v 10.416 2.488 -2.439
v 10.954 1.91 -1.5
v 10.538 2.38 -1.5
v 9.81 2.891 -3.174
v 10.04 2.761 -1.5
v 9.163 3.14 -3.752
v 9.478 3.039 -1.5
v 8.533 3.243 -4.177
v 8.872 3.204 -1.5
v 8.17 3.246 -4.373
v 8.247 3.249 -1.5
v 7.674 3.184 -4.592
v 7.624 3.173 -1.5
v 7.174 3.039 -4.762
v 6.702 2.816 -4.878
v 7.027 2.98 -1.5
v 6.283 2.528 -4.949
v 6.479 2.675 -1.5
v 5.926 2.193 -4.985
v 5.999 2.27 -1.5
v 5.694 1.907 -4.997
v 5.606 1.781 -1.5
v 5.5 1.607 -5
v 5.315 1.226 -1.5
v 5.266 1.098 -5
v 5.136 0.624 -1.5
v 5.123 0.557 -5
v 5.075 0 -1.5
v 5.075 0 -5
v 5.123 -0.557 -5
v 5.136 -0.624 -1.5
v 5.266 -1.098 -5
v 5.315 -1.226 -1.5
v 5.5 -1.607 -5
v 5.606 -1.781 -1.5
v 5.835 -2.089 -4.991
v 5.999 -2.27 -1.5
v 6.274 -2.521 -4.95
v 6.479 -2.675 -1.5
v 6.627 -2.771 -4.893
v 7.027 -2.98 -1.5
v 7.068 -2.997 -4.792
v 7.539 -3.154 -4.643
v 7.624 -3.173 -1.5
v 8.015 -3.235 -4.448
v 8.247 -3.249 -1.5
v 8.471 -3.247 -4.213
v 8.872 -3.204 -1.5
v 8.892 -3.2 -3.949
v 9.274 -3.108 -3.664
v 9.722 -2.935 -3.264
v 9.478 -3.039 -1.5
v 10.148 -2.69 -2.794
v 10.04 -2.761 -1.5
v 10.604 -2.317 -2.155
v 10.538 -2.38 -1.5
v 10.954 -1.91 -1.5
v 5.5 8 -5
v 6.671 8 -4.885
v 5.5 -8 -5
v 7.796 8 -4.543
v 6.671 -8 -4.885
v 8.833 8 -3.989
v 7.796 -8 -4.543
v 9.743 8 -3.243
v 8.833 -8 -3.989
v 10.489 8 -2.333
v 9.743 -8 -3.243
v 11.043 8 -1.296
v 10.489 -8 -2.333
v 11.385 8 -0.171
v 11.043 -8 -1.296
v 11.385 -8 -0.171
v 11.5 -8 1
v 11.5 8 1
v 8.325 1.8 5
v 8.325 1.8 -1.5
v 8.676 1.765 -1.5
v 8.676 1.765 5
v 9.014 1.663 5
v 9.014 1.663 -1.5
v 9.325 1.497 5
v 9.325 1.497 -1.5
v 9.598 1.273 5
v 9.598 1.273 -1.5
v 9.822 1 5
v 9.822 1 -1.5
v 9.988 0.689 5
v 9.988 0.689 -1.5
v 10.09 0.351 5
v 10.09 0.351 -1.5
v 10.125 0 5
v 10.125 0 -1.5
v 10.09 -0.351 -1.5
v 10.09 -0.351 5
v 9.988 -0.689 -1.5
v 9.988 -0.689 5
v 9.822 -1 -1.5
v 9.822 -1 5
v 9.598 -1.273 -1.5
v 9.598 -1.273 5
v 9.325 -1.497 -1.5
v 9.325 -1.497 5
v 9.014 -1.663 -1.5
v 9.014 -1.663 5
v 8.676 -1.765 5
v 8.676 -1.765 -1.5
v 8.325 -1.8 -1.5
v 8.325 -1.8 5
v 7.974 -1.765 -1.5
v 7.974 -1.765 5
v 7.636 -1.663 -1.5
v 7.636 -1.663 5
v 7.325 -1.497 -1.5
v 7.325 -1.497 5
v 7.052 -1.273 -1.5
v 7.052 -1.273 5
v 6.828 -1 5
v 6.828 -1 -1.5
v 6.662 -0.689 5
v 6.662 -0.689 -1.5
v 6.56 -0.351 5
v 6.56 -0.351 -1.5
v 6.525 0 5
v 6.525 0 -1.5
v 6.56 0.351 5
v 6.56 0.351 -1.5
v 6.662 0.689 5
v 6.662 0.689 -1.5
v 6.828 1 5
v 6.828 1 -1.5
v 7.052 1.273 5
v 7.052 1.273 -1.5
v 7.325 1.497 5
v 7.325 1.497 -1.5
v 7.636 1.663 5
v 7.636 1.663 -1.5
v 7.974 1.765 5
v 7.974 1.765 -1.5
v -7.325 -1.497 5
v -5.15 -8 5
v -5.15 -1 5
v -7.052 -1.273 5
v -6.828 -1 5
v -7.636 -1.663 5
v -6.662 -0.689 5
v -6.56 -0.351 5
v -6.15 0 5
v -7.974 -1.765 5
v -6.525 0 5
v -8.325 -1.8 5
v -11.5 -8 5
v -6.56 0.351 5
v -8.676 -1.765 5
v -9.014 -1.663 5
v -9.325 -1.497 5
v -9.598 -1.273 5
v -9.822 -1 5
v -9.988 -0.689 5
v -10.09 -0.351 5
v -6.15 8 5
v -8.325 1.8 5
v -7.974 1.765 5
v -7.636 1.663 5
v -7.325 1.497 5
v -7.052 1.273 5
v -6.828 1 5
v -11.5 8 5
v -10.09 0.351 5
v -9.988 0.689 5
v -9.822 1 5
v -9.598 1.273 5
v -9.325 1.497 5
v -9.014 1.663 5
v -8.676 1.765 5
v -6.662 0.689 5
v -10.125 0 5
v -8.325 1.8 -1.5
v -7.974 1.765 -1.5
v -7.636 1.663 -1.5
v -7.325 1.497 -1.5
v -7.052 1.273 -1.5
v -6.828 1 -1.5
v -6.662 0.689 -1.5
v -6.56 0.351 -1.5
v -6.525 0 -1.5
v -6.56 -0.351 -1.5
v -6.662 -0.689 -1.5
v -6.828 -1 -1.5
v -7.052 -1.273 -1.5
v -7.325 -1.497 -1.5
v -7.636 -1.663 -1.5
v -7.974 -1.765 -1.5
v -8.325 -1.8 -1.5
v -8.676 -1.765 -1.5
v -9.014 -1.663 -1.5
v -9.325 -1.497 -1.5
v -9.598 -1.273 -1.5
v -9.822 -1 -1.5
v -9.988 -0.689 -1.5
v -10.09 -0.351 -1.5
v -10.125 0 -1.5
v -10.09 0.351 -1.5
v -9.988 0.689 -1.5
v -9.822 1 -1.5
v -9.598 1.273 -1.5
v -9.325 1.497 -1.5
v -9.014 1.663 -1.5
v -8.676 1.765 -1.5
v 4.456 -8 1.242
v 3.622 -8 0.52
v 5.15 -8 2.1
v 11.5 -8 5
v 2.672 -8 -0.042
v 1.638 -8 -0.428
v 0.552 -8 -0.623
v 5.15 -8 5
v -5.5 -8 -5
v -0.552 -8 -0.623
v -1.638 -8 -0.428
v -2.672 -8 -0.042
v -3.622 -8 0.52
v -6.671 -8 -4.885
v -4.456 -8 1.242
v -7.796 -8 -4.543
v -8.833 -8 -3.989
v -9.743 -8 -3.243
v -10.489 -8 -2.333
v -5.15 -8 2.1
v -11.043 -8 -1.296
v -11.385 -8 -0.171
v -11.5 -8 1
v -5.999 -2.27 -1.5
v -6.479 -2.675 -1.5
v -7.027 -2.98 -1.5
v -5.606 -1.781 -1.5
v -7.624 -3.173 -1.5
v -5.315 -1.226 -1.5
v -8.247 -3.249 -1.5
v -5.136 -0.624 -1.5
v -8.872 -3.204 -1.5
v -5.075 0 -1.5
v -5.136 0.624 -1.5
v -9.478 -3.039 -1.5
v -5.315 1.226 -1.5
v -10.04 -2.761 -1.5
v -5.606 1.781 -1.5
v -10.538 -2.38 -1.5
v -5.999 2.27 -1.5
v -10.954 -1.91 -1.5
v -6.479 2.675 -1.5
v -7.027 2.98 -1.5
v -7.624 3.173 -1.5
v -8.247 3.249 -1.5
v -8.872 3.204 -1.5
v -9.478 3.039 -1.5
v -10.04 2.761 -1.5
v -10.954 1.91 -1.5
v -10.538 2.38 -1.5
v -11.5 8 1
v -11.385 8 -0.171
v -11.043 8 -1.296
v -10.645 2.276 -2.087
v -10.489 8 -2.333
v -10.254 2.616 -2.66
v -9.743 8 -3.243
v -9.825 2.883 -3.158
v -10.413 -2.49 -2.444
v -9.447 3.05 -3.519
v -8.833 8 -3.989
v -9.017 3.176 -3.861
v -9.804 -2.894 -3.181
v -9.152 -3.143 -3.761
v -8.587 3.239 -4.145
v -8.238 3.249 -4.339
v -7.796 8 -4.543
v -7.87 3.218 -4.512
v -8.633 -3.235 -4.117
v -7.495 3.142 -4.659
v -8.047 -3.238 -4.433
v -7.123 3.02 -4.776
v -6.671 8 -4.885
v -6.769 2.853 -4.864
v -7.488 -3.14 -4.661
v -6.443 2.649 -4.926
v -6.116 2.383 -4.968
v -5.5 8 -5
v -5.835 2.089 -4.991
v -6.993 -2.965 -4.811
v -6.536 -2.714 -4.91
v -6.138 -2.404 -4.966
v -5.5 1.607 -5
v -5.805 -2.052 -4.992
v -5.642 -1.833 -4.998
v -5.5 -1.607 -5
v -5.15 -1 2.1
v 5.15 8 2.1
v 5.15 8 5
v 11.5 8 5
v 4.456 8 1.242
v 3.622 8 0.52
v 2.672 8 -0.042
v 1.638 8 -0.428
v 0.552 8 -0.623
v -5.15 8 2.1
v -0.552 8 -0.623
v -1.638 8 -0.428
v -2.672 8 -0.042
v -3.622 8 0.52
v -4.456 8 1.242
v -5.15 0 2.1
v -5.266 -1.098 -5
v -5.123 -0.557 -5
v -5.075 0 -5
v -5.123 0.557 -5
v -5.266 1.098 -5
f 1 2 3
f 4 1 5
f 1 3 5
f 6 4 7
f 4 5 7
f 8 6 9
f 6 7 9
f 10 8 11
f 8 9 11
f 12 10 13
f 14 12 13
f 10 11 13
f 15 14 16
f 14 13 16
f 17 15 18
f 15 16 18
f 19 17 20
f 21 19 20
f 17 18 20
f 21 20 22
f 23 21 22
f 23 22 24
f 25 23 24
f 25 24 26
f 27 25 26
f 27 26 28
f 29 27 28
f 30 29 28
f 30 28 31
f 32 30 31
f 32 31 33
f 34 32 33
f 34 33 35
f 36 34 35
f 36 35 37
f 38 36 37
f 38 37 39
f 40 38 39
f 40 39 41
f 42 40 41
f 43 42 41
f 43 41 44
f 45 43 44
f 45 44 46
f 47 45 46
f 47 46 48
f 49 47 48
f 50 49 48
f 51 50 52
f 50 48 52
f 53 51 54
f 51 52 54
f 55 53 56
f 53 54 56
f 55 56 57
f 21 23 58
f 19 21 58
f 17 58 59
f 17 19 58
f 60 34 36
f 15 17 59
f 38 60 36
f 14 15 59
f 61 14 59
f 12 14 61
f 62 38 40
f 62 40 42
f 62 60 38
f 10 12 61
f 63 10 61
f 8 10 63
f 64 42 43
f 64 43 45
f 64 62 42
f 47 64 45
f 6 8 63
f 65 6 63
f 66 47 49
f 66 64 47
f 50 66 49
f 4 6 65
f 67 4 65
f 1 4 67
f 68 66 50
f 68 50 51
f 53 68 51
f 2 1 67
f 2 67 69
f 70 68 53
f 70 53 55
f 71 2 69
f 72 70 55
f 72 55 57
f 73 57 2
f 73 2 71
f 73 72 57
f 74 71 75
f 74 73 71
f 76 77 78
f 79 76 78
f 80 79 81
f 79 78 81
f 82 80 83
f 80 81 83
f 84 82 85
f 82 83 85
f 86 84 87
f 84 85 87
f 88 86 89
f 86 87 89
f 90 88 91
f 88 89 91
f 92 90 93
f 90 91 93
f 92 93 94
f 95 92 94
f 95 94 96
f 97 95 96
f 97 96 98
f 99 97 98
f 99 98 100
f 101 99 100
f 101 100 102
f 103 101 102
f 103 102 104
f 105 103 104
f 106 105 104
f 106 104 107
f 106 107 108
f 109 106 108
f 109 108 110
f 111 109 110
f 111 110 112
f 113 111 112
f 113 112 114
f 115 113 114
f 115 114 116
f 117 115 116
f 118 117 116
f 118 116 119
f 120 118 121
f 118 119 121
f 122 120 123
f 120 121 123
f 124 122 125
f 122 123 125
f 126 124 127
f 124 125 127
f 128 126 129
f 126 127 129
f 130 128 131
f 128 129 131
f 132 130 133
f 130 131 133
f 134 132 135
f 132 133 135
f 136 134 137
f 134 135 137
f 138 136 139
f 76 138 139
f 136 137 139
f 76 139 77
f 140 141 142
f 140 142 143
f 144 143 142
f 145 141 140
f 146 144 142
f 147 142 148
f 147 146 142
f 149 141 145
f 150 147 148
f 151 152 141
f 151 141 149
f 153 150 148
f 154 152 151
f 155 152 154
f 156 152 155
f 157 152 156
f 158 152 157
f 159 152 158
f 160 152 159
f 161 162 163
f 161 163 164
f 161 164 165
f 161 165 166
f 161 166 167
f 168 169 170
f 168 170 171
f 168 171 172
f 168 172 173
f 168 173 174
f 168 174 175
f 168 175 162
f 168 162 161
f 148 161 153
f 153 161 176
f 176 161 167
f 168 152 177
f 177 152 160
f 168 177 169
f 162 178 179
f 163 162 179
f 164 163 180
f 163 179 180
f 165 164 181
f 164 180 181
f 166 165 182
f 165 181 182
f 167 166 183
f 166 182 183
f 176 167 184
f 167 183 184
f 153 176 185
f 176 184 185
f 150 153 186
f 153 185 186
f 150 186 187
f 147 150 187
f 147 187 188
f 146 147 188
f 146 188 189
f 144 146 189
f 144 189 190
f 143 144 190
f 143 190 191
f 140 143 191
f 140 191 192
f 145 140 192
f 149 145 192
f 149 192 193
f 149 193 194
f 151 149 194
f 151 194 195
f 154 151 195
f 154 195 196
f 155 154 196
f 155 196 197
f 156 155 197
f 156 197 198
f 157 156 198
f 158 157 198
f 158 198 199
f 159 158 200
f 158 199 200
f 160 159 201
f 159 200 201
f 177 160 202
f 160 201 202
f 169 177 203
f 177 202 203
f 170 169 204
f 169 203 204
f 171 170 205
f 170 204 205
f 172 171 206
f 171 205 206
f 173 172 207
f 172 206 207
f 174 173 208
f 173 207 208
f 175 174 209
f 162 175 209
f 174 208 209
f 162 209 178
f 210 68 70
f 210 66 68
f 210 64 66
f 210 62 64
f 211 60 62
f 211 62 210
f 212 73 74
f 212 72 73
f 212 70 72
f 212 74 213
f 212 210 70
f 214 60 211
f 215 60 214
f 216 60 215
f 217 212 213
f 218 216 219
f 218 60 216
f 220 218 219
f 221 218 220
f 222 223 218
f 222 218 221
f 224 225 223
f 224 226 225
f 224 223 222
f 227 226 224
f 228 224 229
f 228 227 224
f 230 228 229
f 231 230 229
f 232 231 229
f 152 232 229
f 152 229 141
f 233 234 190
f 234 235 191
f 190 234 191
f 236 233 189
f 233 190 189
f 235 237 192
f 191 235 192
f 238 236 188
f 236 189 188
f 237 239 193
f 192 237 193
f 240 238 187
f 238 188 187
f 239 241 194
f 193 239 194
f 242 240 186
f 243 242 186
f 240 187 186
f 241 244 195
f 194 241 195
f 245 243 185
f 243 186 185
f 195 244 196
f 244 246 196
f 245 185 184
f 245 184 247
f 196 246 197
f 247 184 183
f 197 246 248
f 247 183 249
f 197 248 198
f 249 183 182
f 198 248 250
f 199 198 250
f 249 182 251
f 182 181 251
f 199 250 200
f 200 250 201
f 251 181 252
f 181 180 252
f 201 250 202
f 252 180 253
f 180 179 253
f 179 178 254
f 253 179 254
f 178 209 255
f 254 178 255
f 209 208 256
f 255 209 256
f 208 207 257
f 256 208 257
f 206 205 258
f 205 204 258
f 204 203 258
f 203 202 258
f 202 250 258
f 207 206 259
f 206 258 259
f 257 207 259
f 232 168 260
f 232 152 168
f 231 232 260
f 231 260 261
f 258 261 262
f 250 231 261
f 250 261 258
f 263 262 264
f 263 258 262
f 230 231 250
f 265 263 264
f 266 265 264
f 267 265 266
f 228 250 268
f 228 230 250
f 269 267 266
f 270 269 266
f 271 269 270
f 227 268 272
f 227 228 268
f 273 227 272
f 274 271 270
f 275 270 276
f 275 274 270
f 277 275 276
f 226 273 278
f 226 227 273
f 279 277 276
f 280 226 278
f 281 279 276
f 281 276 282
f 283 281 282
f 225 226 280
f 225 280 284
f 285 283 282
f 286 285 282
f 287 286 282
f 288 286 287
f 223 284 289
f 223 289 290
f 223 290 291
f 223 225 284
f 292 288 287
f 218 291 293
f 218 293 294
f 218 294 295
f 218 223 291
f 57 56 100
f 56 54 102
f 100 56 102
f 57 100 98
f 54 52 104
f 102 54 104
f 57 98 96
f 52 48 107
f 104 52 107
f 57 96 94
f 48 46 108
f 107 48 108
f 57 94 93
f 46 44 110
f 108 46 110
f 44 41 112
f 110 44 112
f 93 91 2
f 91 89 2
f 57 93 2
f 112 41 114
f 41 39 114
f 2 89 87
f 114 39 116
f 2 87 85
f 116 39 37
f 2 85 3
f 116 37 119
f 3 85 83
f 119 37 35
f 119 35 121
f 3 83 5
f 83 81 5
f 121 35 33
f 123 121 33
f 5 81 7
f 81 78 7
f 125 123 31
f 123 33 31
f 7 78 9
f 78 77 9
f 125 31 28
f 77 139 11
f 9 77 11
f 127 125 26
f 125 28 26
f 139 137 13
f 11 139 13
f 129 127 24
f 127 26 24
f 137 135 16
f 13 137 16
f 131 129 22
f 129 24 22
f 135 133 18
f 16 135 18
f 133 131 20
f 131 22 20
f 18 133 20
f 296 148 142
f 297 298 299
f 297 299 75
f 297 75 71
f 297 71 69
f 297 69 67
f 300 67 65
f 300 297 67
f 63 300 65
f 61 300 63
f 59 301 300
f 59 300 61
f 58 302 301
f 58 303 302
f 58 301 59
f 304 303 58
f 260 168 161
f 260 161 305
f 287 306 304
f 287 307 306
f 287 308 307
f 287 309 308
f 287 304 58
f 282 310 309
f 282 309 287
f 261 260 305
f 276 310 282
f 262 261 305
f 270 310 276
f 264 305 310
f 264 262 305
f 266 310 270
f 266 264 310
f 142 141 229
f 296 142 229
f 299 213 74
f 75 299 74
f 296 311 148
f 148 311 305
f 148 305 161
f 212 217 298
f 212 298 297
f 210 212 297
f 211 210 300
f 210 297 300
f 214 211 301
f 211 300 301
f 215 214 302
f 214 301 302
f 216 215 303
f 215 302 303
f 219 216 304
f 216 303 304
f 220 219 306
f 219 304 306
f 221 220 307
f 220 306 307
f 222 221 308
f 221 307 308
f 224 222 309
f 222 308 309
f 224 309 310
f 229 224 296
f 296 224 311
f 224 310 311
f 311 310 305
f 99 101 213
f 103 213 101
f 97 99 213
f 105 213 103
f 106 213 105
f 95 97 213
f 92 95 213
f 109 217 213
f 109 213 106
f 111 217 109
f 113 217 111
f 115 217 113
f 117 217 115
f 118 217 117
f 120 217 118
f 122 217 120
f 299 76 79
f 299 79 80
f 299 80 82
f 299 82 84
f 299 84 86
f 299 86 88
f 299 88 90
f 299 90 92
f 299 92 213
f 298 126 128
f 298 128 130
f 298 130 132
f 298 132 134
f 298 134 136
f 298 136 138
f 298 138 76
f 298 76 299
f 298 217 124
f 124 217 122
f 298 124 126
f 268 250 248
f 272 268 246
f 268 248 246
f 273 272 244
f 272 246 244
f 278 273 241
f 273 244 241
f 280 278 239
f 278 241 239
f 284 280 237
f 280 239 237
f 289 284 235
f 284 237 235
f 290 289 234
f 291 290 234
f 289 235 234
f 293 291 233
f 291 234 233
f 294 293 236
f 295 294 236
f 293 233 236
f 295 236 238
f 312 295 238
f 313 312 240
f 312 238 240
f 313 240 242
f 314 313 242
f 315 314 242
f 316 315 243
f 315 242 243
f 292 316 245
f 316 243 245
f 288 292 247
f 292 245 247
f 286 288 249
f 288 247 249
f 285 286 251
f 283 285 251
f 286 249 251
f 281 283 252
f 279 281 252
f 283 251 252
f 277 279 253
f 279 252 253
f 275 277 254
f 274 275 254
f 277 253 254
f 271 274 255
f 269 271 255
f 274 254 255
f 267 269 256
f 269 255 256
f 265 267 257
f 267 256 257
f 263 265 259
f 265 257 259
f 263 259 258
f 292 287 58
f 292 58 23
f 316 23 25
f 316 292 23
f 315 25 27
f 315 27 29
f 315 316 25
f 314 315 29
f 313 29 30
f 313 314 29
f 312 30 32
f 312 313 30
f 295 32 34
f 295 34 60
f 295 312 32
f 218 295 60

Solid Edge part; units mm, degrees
sketch "Sketch1" plane through (0, 0, 0) normal (1, 0, 0) x (0, 1, 0)
  line L0 (-8, 5) -> (8, 5)
  line L1 (8, 5) -> (8, -5)
  line L2 (8, -5) -> (-8, -5)
  line L3 (-8, -5) -> (-8, 5)
  dimension "D1" = 10
  dimension "D2" = 16
extrude "Protrusion1" add sketch "Sketch1" along normal mid plane 23
sketch "Sketch2" plane through (0, 8, 0) normal (0, 1, 0) x (0, 0, -1)
  line L0 (-5, 5.15) -> (-5, -5.15)
  line L1 (-5, -5.15) -> (-2.1, -5.15)
  arc A0 (-2.1, -5.15) -> (-2.1, 5.15) centre (-5.5522, 0) ccw
  line L2 (-5, 5.15) -> (-2.1, 5.15)
  dimension "D1" = 10.3
  dimension "D2" = 6.2
  dimension "D3" = 2.9
extrude "Extrusionsausschnitt_1" cut sketch "Sketch2" against normal blind 22.6589
fillet "Verrundung_1" radius 6 2 edges at (-11.5, 0, -5) (11.5, 0, -5)
hole "Bohrung_1" at (-8.325, 0, -5) direction (0, 0, 1) diameter 3.6 end through all counterbore diameter 6.5 counterbore depth 3.5
hole "Hole1" at (8.325, 0, -5) direction (0, 0, 1) diameter 3.6 end through all counterbore diameter 6.5 counterbore depth 3.5
sketch "Sketch3" plane through (0, 8, 0) normal (0, 1, 0) x (-1, 0, 0)
  line L0 (5.15, 2.1) -> (6.15, 5)
  line L1 (6.15, 5) -> (5.15, 5)
  line L2 (5.15, 5) -> (5.15, 2.1)
  dimension "D1" = 1
extrude "Extrusionsausschnitt_2" cut sketch "Sketch3" against normal blind 8
chamfer "Fase_1" distance 1 angle 45 1 edges at (-5.15, 0, 3.55)
